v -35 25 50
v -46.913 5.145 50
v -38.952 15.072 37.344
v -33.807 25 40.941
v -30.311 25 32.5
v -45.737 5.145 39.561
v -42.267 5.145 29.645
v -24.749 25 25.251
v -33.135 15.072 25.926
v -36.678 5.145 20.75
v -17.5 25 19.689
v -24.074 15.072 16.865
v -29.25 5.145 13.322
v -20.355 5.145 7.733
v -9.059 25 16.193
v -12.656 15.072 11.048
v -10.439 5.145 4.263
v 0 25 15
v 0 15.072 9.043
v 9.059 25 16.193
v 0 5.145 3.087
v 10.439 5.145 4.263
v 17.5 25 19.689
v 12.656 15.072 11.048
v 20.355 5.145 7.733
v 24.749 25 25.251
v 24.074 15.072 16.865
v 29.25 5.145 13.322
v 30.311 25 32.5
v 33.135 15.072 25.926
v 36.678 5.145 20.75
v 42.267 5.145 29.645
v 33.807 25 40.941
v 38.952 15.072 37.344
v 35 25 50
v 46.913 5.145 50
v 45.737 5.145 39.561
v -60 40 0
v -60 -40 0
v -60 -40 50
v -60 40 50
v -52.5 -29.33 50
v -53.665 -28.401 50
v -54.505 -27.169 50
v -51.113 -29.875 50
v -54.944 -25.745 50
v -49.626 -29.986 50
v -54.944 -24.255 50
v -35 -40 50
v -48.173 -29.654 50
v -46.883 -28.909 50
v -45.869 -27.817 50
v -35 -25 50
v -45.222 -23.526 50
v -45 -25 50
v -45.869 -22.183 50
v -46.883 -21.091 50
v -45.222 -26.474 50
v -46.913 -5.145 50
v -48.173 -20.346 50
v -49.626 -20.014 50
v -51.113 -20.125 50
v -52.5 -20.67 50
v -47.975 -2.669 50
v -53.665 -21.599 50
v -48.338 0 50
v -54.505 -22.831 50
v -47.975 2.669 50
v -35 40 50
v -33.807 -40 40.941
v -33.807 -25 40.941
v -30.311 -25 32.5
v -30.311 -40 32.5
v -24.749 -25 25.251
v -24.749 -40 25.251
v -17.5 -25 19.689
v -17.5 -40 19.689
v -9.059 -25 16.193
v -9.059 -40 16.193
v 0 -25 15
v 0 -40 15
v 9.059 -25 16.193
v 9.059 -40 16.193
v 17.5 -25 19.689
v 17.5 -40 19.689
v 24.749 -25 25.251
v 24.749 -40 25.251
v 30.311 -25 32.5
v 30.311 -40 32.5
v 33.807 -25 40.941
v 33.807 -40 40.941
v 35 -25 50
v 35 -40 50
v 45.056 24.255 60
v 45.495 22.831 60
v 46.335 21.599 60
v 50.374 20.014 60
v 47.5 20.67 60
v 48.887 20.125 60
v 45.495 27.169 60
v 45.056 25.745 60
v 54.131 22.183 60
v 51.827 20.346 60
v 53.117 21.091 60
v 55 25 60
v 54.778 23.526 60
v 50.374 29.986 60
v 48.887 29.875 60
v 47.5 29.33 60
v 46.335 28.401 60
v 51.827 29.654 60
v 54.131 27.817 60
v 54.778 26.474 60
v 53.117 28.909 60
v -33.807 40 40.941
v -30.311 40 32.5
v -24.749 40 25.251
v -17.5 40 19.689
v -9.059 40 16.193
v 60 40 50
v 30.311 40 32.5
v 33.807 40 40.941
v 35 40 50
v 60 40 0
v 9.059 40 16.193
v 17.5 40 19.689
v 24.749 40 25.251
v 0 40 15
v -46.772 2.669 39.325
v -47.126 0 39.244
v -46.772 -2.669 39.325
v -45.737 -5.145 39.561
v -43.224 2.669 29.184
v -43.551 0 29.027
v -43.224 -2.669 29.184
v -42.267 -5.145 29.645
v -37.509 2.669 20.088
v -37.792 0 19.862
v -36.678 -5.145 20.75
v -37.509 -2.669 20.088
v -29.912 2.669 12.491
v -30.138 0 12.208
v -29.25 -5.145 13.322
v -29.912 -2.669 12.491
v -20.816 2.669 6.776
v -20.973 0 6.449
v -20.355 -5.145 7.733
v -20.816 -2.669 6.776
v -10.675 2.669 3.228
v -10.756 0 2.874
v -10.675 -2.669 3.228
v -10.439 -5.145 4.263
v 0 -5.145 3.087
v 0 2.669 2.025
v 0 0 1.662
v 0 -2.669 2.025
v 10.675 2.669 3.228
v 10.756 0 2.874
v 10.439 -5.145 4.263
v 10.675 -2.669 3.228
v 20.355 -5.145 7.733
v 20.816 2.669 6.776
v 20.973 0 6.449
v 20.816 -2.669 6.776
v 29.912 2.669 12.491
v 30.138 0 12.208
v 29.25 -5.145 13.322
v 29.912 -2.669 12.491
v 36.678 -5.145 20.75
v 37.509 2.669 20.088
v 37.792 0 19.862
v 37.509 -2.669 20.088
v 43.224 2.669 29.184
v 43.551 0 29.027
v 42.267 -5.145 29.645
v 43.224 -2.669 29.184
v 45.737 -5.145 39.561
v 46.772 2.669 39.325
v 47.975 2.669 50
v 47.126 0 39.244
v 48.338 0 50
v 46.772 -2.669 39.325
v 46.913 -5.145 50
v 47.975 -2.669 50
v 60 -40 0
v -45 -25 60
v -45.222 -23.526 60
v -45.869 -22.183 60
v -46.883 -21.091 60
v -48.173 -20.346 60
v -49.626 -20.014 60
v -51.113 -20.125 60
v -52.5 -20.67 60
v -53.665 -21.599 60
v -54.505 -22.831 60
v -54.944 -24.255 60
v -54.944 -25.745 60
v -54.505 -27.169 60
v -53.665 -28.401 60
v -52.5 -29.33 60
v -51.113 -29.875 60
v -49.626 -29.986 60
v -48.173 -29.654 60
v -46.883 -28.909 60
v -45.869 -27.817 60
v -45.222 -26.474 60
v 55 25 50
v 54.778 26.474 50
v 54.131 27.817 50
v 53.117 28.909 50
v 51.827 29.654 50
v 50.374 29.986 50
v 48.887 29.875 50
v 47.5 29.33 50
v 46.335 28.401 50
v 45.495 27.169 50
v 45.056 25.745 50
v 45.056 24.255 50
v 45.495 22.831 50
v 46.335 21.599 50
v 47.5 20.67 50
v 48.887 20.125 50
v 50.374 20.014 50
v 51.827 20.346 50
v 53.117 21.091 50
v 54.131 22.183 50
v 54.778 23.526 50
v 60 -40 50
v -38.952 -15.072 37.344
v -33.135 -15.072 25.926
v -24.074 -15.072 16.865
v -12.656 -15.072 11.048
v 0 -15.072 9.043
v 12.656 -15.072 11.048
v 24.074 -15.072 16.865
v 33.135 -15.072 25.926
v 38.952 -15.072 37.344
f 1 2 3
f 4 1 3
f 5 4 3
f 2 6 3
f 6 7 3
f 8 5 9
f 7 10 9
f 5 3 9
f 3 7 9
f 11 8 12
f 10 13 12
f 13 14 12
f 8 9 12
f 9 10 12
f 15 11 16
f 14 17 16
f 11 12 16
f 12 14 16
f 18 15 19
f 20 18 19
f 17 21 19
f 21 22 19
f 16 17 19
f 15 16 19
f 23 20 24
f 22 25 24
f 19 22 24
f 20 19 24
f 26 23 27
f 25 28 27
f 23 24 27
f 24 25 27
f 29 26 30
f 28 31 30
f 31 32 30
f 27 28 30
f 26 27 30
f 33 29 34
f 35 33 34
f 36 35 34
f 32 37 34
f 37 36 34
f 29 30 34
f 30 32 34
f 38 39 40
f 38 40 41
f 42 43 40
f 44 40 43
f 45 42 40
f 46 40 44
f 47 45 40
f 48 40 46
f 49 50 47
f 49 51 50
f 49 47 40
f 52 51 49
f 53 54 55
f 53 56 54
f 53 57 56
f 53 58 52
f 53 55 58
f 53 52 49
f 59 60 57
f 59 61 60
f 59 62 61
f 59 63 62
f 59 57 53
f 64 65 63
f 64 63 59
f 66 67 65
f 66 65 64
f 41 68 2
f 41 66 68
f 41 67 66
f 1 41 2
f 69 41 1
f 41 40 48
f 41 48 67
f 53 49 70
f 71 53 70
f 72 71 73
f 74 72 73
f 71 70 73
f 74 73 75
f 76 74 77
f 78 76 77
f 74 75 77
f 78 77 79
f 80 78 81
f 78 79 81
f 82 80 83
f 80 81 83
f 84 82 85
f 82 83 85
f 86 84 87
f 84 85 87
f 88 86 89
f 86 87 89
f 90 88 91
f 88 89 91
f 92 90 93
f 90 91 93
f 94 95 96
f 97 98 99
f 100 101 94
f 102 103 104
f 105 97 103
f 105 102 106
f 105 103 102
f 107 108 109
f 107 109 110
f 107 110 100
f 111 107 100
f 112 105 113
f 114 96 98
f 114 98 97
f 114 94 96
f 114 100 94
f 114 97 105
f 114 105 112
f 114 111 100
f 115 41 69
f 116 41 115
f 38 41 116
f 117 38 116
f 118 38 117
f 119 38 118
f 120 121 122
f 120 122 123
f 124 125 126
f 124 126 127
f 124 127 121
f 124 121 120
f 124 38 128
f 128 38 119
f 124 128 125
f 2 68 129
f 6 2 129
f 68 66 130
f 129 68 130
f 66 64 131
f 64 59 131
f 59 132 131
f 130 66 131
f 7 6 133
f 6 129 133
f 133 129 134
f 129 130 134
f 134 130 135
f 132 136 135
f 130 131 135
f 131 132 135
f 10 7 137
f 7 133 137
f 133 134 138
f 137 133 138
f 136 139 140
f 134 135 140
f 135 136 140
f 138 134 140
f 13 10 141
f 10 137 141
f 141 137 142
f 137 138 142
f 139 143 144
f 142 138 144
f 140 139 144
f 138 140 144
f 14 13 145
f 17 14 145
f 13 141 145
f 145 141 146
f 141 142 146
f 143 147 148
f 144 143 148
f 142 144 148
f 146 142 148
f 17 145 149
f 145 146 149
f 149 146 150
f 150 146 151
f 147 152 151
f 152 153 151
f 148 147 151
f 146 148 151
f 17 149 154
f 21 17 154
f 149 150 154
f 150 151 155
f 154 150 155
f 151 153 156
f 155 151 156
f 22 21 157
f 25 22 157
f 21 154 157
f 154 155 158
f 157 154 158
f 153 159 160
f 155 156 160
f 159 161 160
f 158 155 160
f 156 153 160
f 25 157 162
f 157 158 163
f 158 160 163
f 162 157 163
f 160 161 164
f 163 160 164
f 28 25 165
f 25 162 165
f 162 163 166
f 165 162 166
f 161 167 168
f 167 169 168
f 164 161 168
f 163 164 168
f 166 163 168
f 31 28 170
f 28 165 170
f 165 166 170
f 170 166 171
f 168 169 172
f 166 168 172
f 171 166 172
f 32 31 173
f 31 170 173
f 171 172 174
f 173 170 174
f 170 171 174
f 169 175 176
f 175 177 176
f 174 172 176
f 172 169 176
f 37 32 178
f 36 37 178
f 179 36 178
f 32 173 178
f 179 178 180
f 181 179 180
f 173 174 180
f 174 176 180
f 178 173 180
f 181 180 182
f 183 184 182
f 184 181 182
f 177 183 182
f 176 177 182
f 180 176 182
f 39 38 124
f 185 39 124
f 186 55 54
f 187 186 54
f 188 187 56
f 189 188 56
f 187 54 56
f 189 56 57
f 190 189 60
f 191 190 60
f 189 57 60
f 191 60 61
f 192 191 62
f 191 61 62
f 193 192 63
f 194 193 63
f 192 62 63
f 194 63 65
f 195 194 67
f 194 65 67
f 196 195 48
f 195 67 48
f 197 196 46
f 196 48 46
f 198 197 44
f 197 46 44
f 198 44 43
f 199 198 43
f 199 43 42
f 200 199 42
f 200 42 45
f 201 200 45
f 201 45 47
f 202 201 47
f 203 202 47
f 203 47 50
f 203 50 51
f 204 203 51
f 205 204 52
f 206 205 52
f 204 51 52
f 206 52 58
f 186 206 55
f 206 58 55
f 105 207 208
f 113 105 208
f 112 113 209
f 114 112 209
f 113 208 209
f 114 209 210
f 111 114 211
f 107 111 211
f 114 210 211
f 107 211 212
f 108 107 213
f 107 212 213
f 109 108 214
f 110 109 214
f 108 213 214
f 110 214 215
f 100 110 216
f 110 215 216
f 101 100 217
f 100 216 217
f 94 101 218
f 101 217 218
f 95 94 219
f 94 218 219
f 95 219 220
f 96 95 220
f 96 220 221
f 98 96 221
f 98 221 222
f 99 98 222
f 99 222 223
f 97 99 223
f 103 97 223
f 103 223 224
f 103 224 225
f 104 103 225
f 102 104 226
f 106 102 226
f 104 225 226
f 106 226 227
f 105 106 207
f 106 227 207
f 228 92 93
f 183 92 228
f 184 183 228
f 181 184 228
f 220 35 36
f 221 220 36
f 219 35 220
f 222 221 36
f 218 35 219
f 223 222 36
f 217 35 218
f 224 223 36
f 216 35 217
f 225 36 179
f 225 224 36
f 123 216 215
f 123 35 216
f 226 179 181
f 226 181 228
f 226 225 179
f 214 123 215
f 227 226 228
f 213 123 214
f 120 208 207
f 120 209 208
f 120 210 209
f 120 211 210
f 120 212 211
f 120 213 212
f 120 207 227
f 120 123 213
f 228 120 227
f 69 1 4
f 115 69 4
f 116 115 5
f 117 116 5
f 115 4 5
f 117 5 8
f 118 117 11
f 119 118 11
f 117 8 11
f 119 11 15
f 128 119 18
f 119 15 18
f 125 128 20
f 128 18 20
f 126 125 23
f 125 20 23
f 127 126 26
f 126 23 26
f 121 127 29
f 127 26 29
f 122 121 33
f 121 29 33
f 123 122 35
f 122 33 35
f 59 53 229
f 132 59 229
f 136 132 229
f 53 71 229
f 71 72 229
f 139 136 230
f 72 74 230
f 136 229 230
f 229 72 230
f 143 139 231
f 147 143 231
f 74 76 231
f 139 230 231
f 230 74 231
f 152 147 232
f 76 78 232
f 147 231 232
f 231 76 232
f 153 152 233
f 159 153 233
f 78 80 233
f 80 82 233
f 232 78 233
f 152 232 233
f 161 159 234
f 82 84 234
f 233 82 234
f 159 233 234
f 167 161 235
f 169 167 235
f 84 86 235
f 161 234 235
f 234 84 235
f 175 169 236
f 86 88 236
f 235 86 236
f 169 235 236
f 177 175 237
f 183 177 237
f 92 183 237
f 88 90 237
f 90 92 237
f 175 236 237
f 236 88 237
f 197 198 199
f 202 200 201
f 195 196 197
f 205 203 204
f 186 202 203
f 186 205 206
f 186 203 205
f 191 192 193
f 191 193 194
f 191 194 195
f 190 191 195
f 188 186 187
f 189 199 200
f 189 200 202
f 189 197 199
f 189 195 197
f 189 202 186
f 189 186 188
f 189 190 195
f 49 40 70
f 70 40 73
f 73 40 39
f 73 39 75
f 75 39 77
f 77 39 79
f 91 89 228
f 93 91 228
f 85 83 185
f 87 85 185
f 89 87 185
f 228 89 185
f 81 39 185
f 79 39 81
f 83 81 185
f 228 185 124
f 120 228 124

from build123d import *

# Parameters (mm, degrees)
SKETCH1_W           = 120
SKETCH1_H           = 80
BOSS_EXTRUDE1_DEPTH = 50
SKETCH3_R           = 5
BOSS_EXTRUDE2_DEPTH = 10


with BuildPart() as part:
    # Sketch1 → Boss-Extrude1 (new body)
    with BuildSketch(Plane.XY):
        Rectangle(SKETCH1_W, SKETCH1_H)
    extrude(amount=BOSS_EXTRUDE1_DEPTH)

    # Sketch3 → Boss-Extrude2 (add)
    with BuildSketch(Plane.XY.offset(50)):
        with Locations((50, 25)):
            Circle(SKETCH3_R)
        with Locations((-50, -25)):
            Circle(SKETCH3_R)
    extrude(amount=BOSS_EXTRUDE2_DEPTH)

    # Sketch2 → Cut-Revolve2 (revolve, cut)
    with BuildSketch(Plane.XY.offset(50)):
        with BuildLine():
            Line((-35, 40), (-35, 25))
            Line((-35, 25), (-46.913025467, 5.144957554))
            ThreePointArc((-46.913025467, 5.144957554), (-48.33809621, 0), (-46.913025467, -5.144957554))
            Line((-46.913025467, -5.144957554), (-35, -25))
            Line((-35, -25), (-35, -40))
            Line((-35, -40), (0, -40))
            Line((0, -40), (0, 40))
            Line((0, 40), (-35, 40))
        make_face()
    revolve(axis=Axis((0, 43.927138889, 50), (0, -1, 0)), mode=Mode.SUBTRACT)


solid = part.part
